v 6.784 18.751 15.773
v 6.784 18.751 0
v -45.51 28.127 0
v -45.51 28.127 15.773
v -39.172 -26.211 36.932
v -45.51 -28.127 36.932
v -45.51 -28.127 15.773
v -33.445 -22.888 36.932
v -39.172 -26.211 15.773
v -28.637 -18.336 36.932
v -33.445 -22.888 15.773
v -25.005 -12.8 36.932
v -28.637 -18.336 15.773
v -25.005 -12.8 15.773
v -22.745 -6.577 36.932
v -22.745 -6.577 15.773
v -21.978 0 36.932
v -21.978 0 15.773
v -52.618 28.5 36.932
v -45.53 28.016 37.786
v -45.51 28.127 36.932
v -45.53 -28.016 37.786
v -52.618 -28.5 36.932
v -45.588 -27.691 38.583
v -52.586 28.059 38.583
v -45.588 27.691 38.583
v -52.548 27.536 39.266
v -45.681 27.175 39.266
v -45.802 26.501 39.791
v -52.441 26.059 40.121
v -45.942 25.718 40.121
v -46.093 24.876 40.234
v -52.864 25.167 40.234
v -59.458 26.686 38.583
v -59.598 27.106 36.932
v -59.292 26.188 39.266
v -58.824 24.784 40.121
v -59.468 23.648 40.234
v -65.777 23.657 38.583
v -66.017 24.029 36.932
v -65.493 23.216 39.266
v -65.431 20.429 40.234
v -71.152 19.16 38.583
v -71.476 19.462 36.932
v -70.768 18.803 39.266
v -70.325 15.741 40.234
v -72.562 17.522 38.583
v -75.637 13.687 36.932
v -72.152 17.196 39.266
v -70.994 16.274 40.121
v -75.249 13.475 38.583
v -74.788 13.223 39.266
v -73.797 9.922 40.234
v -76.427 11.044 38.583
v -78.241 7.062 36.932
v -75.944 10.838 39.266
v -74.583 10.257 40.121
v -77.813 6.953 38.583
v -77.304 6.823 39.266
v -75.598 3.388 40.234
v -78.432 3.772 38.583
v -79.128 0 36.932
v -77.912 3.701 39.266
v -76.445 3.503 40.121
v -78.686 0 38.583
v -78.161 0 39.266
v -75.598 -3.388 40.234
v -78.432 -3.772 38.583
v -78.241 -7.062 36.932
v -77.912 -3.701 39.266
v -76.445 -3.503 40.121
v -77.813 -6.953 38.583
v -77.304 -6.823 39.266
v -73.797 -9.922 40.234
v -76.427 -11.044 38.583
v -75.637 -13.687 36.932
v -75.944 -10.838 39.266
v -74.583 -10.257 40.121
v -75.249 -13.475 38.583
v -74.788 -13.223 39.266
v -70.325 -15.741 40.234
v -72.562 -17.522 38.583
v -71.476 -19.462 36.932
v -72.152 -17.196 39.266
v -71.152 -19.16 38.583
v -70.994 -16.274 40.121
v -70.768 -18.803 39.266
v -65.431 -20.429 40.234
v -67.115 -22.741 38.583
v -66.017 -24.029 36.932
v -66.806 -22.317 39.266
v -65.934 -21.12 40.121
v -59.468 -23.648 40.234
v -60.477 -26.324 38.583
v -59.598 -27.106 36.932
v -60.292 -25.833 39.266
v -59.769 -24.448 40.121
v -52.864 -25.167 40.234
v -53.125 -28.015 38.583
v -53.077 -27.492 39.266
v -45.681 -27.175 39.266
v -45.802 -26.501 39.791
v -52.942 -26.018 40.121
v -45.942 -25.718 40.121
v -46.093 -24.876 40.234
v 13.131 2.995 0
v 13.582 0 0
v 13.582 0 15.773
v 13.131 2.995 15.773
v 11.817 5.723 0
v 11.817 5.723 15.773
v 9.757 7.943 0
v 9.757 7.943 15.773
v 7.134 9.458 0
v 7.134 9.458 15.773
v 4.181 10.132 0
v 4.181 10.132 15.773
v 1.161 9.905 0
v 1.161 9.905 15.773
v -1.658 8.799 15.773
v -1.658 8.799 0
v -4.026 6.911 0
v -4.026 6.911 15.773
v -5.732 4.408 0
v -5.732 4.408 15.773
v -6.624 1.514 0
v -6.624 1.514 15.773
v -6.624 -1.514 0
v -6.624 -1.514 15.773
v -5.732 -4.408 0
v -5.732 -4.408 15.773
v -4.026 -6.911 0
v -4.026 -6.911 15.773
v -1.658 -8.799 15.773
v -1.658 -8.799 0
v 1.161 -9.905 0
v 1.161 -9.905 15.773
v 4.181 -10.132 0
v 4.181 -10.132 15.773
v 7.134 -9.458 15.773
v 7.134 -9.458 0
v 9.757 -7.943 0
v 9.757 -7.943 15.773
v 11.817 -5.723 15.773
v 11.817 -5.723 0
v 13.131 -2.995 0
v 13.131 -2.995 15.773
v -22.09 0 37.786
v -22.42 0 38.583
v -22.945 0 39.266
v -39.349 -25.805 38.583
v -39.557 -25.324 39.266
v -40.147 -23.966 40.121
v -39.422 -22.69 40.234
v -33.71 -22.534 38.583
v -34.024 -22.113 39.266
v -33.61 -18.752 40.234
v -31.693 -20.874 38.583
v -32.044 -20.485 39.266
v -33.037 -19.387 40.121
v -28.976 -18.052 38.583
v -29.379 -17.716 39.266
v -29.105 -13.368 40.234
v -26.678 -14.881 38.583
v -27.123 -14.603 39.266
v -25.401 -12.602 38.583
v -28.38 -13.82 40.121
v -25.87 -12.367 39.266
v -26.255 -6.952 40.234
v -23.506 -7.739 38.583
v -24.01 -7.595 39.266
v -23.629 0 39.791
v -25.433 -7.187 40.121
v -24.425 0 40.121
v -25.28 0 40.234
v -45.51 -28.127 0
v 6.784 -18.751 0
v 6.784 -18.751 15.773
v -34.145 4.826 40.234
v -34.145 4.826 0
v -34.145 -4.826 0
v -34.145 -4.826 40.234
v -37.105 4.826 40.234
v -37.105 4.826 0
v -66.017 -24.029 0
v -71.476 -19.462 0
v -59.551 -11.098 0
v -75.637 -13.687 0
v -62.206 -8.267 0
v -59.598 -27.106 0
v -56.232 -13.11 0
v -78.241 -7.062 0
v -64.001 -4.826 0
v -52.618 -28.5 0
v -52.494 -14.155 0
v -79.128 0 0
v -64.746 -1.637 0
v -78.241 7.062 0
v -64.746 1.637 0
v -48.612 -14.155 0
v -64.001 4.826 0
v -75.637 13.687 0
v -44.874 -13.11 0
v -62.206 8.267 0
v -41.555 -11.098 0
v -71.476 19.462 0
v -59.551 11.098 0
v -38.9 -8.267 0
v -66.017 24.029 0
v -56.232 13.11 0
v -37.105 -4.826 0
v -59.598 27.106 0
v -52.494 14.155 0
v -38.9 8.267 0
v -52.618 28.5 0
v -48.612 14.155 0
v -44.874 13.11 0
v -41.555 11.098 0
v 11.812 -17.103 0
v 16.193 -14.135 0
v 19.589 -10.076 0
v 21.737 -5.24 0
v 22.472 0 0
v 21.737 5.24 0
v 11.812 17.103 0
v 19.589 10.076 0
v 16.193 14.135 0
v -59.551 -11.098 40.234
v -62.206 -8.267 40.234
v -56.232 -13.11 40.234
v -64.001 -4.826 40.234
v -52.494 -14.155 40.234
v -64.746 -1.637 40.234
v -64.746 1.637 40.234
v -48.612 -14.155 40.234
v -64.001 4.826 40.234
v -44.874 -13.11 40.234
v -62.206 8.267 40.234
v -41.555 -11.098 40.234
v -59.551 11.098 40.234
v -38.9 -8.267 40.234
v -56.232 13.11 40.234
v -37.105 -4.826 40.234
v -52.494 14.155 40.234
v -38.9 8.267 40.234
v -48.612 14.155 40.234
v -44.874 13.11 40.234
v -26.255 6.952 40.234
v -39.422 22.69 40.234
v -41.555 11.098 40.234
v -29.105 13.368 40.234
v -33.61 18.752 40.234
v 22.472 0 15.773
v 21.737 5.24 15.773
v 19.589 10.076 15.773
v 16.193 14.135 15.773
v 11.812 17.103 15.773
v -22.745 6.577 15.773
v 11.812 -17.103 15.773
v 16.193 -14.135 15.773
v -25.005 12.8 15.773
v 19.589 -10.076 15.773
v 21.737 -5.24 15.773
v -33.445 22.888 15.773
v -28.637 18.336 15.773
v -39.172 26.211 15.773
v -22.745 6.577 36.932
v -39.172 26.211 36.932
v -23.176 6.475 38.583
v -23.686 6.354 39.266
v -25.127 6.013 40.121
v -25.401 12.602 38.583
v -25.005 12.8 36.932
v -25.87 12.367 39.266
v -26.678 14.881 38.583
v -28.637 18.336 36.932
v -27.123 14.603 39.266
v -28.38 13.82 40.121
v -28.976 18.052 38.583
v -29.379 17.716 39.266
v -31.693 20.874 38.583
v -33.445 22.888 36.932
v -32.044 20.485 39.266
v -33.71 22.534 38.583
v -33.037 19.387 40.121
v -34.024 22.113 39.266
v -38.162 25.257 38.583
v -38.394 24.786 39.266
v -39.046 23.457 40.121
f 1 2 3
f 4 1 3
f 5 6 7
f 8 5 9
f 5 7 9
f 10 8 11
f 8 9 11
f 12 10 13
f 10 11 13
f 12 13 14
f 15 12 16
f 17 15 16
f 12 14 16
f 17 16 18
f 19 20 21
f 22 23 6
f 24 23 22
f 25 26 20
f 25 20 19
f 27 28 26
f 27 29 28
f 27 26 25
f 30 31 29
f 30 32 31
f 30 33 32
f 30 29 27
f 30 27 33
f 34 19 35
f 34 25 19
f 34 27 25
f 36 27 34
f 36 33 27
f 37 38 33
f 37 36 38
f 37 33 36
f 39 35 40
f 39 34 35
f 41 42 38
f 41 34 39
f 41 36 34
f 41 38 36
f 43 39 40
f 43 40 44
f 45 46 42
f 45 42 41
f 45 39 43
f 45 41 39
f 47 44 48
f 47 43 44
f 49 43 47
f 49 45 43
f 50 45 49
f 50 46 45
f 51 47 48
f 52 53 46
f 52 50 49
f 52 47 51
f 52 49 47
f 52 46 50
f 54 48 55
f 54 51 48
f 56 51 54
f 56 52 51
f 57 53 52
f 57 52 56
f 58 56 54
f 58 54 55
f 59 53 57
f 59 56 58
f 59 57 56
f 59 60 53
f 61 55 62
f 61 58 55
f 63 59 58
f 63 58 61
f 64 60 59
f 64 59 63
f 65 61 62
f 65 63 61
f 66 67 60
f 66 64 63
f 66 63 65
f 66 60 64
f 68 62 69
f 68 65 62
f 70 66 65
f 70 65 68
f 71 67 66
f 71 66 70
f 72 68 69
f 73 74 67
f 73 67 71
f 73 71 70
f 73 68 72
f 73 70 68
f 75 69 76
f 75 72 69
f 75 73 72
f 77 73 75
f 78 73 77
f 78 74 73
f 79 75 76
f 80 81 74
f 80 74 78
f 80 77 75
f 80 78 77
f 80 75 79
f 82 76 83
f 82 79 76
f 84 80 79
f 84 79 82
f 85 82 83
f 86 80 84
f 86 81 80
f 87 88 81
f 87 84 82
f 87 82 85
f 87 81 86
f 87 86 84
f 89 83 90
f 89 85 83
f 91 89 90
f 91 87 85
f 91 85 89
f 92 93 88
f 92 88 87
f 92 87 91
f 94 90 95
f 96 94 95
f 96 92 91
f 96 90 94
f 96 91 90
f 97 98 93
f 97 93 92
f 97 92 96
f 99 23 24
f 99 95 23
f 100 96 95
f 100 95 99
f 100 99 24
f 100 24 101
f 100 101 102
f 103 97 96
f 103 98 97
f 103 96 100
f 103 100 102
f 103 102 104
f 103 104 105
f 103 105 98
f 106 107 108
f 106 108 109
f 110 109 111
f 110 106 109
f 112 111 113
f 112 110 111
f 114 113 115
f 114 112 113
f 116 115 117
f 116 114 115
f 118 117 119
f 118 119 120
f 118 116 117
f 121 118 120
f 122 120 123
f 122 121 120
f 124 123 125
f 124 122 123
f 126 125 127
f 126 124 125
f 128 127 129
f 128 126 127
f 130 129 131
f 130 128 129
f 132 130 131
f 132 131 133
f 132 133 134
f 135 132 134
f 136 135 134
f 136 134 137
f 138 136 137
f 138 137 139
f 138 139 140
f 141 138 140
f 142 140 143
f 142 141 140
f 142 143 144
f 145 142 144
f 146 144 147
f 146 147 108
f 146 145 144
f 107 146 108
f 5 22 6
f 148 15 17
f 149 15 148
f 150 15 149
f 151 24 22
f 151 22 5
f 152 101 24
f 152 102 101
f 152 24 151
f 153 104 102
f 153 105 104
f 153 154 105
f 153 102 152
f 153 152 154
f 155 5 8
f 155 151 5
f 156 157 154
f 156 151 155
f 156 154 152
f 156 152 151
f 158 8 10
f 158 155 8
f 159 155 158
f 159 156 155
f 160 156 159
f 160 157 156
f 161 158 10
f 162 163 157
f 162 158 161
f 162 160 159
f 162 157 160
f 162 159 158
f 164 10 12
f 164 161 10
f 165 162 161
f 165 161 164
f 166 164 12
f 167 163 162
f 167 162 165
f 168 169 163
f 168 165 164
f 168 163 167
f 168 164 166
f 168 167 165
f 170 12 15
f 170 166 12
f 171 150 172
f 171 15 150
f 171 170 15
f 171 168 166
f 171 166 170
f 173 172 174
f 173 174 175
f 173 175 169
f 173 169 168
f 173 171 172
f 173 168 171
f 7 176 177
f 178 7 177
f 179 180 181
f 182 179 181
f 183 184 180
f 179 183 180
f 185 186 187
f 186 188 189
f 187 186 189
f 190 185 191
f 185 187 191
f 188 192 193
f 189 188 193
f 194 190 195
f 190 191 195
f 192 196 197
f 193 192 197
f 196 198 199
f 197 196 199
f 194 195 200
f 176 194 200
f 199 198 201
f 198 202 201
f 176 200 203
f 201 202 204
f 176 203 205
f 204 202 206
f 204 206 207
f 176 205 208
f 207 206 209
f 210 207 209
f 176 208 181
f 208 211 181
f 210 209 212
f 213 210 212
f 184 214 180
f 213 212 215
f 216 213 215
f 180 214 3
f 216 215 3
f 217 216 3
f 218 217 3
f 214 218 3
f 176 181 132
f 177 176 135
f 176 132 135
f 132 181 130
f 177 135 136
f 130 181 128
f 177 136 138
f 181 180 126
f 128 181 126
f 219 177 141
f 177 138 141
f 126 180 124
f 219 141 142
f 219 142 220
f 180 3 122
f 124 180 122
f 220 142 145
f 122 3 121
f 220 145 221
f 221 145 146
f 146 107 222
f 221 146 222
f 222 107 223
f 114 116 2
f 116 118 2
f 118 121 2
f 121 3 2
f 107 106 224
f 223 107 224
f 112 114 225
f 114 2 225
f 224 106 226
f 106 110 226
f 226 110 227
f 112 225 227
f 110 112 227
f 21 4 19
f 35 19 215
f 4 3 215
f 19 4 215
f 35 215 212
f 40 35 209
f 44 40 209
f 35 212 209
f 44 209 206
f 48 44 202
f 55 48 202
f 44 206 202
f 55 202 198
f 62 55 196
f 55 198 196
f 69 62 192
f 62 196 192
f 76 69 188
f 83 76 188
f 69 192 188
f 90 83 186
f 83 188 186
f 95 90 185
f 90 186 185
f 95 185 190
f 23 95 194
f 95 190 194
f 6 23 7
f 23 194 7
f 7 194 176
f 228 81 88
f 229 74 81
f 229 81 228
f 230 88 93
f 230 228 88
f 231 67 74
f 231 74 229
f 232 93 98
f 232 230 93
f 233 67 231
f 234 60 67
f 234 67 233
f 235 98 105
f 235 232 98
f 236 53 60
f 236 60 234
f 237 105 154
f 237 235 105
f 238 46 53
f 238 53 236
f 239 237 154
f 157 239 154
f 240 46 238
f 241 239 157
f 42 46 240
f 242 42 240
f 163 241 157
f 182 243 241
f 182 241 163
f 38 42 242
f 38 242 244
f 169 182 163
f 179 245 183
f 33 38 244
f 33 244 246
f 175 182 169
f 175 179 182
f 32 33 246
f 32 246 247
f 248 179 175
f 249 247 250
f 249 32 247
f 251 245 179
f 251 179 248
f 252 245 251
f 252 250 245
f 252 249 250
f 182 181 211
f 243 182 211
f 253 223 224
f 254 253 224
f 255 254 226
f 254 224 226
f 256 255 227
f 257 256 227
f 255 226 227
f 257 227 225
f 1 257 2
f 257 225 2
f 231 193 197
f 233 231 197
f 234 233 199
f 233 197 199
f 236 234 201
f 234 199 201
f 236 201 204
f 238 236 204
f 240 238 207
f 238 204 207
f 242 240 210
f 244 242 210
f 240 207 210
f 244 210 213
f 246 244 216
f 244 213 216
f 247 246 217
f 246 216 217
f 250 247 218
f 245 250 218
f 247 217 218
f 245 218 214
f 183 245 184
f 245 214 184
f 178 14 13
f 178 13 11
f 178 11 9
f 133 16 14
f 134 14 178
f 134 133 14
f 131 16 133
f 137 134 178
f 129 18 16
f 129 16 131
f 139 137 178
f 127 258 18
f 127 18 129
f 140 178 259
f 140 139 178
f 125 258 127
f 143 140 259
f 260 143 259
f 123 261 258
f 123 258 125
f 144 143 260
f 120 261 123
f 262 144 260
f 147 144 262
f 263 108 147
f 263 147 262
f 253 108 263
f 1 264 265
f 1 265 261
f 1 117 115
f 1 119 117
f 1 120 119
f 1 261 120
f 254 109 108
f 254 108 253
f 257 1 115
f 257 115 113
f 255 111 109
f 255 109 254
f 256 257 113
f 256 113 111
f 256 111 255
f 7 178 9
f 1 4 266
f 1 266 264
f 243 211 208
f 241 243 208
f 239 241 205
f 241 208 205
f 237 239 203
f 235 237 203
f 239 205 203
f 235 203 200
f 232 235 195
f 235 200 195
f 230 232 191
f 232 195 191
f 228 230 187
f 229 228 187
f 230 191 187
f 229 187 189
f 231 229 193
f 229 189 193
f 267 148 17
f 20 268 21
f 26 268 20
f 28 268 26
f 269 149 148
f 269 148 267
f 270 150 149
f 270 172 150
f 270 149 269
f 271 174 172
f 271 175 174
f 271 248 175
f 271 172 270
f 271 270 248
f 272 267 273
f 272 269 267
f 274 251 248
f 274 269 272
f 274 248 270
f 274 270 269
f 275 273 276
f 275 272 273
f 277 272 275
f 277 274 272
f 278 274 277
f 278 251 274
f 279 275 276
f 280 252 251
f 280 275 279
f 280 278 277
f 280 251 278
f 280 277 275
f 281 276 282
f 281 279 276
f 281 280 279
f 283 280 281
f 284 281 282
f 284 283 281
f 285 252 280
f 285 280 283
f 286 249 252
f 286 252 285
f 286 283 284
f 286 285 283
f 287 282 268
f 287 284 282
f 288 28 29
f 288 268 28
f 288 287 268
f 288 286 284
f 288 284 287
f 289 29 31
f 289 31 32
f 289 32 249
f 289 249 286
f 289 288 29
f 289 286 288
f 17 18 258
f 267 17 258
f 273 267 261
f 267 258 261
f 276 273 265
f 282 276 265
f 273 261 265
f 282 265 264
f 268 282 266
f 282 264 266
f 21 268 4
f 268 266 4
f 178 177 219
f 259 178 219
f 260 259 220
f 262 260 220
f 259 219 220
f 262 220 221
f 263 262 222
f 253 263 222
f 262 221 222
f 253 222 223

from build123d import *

# Parameters (mm, degrees)
F1_DEPTH = 40.2336
F0_R     = 10.16
F2_DEPTH = 15.7734
F3_R     = 3.302


with BuildPart() as f1:
    # F0 (on Top) → F1 (new body)
    with BuildSketch(Plane.XY):
        with BuildLine():
            ThreePointArc((-45.510295, 28.126541), (-79.127942, 0), (-45.510295, -28.126541))
            ThreePointArc((-45.510295, -28.126541), (-28.636917, -18.336262), (-21.977942, 0))
            ThreePointArc((-21.977942, 0), (-28.636917, 18.336262), (-45.510295, 28.126541))
        make_face()
        with BuildLine():
            ThreePointArc((-64.000707, 4.826), (-50.552942, 14.2875), (-37.105177, 4.826))
            Line((-37.105177, 4.826), (-34.144542, 4.826))
            Line((-34.144542, 4.826), (-34.144542, -4.826))
            Line((-34.144542, -4.826), (-37.105177, -4.826))
            ThreePointArc((-37.105177, -4.826), (-50.552942, -14.2875), (-64.000707, -4.826))
            ThreePointArc((-64.000707, -4.826), (-64.840442, 0), (-64.000707, 4.826))
        make_face(mode=Mode.SUBTRACT)
    extrude(amount=F1_DEPTH)

    # F0 (on Top) → F2 (join)
    with BuildSketch(Plane.XY):
        with BuildLine():
            Line((-45.510295, -28.126541), (6.783823, -18.751028))
            ThreePointArc((6.783823, -18.751028), (-15.627942, 0), (6.783823, 18.751028))
            Line((6.783823, 18.751028), (-45.510295, 28.126541))
            ThreePointArc((-45.510295, 28.126541), (-28.636917, 18.336262), (-21.977942, 0))
            ThreePointArc((-21.977942, 0), (-28.636917, -18.336262), (-45.510295, -28.126541))
        make_face()
        with BuildLine():
            ThreePointArc((6.783823, 18.751028), (-15.627942, 0), (6.783823, -18.751028))
            ThreePointArc((6.783823, -18.751028), (18.032741, -12.224174), (22.472058, 0))
            ThreePointArc((22.472058, 0), (18.032741, 12.224175), (6.783823, 18.751028))
        make_face()
        with Locations((3.422058, 0)):
            Circle(F0_R, mode=Mode.SUBTRACT)
    extrude(amount=F2_DEPTH)

    # F3
    f3_edges = [f1.edges().sort_by_distance(p)[0] for p in [
        (-55.595589, 28.126541, 40.2336),
    ]]
    fillet(f3_edges, radius=F3_R)


solid = f1.part
